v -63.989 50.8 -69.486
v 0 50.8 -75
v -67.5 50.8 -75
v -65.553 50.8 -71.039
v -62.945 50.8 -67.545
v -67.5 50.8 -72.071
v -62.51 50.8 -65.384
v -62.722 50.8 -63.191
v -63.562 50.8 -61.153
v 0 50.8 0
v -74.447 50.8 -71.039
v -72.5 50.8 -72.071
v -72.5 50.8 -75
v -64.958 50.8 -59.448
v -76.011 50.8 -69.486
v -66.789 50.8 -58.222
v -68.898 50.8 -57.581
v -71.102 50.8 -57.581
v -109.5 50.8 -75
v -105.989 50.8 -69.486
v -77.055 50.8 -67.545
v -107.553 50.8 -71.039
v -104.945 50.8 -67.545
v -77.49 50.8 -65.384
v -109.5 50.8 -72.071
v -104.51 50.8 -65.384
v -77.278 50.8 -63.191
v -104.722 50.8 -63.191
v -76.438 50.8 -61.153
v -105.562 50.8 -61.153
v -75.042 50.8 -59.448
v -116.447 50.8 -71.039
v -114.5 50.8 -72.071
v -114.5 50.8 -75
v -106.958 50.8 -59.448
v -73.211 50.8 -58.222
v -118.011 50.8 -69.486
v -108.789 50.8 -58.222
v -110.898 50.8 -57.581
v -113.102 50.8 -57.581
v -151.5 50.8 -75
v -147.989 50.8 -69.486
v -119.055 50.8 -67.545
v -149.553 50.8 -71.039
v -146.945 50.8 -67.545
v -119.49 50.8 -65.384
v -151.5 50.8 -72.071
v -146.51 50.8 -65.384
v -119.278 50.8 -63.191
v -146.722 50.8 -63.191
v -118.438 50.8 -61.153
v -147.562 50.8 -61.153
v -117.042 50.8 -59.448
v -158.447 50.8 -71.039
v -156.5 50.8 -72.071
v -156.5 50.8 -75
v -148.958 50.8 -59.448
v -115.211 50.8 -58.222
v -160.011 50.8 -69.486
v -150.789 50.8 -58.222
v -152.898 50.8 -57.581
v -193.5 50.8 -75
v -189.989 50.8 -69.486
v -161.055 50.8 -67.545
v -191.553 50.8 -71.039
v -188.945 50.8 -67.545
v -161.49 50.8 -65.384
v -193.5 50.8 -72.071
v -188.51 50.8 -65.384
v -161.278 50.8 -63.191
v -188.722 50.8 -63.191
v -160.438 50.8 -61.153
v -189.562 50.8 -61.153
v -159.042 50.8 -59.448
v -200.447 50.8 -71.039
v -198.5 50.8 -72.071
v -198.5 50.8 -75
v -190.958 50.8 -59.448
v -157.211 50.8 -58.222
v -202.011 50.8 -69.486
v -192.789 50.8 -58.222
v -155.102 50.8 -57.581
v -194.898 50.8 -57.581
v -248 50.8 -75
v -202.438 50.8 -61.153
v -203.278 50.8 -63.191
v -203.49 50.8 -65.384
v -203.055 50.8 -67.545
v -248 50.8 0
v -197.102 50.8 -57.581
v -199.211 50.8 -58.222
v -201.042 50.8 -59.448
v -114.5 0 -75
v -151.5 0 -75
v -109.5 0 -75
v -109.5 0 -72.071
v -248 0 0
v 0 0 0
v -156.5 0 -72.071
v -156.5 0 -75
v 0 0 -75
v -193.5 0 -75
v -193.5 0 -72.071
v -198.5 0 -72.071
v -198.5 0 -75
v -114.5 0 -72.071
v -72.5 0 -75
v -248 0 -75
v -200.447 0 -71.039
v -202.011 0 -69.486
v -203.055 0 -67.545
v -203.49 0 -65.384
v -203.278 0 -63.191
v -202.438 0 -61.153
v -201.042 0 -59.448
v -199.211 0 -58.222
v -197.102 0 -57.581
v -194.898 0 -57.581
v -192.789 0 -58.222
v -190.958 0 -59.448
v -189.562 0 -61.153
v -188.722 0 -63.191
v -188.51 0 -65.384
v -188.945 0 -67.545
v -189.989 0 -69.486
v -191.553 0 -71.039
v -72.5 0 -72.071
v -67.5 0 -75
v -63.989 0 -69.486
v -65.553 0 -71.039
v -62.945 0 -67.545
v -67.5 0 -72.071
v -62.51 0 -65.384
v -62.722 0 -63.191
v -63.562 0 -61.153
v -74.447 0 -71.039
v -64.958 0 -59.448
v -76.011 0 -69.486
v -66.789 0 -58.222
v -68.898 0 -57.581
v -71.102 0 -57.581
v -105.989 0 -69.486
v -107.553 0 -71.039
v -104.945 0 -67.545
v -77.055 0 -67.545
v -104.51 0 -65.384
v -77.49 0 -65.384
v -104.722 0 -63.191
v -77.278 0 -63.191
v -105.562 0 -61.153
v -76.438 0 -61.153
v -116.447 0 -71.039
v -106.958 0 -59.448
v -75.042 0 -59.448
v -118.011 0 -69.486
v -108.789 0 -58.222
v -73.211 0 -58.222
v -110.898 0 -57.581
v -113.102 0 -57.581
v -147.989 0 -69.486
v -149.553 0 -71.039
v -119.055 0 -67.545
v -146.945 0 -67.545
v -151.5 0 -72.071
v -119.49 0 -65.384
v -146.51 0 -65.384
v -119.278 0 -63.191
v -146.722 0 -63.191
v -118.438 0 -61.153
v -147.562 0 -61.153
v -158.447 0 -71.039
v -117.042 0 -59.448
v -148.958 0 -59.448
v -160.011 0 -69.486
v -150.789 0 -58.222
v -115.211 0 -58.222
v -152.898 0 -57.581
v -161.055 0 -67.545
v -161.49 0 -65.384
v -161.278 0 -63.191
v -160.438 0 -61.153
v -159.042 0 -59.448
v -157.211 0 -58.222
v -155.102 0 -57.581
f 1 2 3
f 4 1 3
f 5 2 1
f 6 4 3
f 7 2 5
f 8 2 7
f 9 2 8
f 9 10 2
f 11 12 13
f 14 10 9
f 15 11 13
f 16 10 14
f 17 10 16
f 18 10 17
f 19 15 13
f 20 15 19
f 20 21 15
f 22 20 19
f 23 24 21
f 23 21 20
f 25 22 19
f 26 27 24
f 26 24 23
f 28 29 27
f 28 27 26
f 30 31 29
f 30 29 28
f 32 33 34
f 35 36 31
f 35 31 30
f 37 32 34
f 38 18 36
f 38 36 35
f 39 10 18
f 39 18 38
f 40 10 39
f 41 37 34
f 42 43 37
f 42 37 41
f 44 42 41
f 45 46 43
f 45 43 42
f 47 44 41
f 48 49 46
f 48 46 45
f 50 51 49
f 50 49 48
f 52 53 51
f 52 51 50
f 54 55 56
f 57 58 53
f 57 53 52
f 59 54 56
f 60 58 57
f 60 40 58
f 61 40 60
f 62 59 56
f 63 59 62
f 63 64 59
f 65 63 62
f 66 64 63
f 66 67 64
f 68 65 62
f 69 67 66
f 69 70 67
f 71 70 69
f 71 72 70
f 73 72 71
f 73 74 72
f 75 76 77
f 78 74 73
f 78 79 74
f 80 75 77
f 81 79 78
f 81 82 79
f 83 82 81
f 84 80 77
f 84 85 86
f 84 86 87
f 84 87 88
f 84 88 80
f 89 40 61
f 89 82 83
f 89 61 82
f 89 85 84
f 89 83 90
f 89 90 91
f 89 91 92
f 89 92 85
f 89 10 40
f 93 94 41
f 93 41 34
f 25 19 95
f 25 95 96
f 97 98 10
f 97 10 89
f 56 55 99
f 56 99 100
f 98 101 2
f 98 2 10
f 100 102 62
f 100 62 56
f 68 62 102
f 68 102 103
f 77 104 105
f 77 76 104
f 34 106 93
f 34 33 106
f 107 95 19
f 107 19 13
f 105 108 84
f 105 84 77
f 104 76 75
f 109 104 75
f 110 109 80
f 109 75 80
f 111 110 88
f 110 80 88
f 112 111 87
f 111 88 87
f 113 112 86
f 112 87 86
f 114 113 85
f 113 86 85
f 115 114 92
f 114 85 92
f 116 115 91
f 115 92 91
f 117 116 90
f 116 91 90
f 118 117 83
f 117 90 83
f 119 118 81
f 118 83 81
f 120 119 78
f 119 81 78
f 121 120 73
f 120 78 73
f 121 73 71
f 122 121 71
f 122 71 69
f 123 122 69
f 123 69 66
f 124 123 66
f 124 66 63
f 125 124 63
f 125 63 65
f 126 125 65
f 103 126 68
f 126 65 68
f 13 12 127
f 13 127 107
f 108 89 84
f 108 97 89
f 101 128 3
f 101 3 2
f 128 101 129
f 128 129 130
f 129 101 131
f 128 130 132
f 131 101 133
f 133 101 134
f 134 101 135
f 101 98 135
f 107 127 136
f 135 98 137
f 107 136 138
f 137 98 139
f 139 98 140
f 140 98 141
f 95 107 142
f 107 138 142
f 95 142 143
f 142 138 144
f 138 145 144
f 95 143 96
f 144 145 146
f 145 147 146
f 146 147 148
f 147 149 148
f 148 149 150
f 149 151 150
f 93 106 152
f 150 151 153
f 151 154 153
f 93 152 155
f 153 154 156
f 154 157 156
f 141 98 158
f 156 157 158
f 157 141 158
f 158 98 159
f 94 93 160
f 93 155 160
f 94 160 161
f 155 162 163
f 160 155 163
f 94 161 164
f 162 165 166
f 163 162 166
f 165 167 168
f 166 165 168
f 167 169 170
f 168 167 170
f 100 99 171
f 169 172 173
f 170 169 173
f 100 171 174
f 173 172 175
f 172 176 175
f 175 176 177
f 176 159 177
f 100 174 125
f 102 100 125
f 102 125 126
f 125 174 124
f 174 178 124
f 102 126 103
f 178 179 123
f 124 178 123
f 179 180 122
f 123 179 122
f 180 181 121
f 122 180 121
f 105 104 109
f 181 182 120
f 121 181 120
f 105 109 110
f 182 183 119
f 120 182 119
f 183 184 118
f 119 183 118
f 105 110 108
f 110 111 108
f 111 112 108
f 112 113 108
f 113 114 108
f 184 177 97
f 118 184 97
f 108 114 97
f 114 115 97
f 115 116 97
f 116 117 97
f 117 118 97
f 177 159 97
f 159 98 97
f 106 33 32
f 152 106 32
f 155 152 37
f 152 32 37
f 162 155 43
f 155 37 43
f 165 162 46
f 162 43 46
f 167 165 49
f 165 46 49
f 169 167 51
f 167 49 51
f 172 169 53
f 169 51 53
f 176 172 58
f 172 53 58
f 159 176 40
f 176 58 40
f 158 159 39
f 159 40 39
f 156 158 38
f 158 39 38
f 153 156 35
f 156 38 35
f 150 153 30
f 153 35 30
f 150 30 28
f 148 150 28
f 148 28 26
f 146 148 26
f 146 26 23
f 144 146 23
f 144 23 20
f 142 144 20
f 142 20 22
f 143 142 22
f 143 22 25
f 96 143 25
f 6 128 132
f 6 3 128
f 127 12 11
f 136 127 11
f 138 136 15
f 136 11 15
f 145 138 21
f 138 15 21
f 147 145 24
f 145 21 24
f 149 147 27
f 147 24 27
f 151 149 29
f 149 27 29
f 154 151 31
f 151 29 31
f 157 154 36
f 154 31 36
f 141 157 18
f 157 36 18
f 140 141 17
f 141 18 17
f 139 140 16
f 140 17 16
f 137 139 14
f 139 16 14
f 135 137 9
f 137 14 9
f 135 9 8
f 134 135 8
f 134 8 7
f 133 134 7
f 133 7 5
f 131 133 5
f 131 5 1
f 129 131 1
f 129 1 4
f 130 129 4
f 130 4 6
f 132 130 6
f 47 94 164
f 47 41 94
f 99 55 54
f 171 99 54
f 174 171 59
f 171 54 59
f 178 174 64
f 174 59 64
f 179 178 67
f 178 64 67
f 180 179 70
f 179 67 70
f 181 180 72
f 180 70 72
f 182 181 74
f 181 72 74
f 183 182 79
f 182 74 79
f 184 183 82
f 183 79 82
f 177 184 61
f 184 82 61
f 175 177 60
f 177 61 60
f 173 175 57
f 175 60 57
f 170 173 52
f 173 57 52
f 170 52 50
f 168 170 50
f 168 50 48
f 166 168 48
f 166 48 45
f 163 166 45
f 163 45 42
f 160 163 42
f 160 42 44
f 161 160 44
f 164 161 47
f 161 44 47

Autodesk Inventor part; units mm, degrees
ref_plane "YZ Plane" through (0, 0, 0) normal (1, 0, 0) x (0, 1, 0)
ref_plane "XZ Plane" through (0, 0, 0) normal (0, 1, 0) x (-1, 0, 0)
ref_plane "XY Plane" through (0, 0, 0) normal (0, 0, 1) x (1, 0, 0)
sketch "Sketch1" plane through (0, 0, 0) normal (0, 1, 0) x (-1, 0, 0)
  line L0 (0, 0) -> (248, 0)
  line L1 (248, 0) -> (248, -75)
  line L2 (248, -75) -> (0, -75)
  line L3 (0, -75) -> (0, 0)
  dimension "d0" = 248
  dimension "d1" = 75
extrude "Extrusion1" add sketch "Sketch1" along normal blind 50.8
sketch "Sketch2" plane through (0, 50.8, 0) normal (0, 1, 0) x (1, 0, 0)
  circle A0 centre (-196, 65) radius 7.5
  line L0 (0, 75) -> (-248, 75) projected
  line L1 (-248, 75) -> (-248, 0) projected
  circle A1 centre (-154, 65) radius 7.5
  circle A2 centre (-112, 65) radius 7.5
  circle A3 centre (-70, 65) radius 7.5
  point P0 (0, 0)
  dimension "d4" = 15
  dimension "d5" = 10
  dimension "d6" = 52
  dimension "d12" = 42
extrude "Extrusion2" cut sketch "Sketch2" against normal blind 50.8
sketch "Sketch3" plane through (0, 50.8, 0) normal (0, 1, 0) x (1, 0, 0)
  line L0 (0, 75) -> (-248, 75) projected
  line L1 (-198.5, 75) -> (-193.5, 75)
  line L2 (-193.5, 75) -> (-193.5, 72)
  line L3 (-193.5, 72) -> (-198.5, 72)
  line L4 (-198.5, 72) -> (-198.5, 75)
  circle A0 centre (-196, 65) radius 7.5 projected
  line L5 (-151.5, 75) -> (-151.5, 72)
  line L6 (-151.5, 72) -> (-156.5, 72)
  line L7 (-156.5, 72) -> (-156.5, 75)
  line L8 (-156.5, 75) -> (-151.5, 75)
  line L9 (-109.5, 75) -> (-109.5, 72)
  line L10 (-109.5, 72) -> (-114.5, 72)
  line L11 (-114.5, 72) -> (-114.5, 75)
  line L12 (-114.5, 75) -> (-109.5, 75)
  line L13 (-67.5, 75) -> (-67.5, 72)
  line L14 (-67.5, 72) -> (-72.5, 72)
  line L15 (-72.5, 72) -> (-72.5, 75)
  line L16 (-72.5, 75) -> (-67.5, 75)
  point P0 (0, 0)
  dimension "d16" = 5
  dimension "d17" = 3
  dimension "d18" = 2.5
  dimension "d24" = 42
extrude "Extrusion3" cut sketch "Sketch3" against normal blind 50.8 contours L13 L14 L15 L0 | L2 A0 L4 L0 | L5 L6 L7 L0 | L9 L10 L11 L0 | L2 L3 L4 A0 picked at (-196.2826, 72.1506)
properties part number "Lateral"
